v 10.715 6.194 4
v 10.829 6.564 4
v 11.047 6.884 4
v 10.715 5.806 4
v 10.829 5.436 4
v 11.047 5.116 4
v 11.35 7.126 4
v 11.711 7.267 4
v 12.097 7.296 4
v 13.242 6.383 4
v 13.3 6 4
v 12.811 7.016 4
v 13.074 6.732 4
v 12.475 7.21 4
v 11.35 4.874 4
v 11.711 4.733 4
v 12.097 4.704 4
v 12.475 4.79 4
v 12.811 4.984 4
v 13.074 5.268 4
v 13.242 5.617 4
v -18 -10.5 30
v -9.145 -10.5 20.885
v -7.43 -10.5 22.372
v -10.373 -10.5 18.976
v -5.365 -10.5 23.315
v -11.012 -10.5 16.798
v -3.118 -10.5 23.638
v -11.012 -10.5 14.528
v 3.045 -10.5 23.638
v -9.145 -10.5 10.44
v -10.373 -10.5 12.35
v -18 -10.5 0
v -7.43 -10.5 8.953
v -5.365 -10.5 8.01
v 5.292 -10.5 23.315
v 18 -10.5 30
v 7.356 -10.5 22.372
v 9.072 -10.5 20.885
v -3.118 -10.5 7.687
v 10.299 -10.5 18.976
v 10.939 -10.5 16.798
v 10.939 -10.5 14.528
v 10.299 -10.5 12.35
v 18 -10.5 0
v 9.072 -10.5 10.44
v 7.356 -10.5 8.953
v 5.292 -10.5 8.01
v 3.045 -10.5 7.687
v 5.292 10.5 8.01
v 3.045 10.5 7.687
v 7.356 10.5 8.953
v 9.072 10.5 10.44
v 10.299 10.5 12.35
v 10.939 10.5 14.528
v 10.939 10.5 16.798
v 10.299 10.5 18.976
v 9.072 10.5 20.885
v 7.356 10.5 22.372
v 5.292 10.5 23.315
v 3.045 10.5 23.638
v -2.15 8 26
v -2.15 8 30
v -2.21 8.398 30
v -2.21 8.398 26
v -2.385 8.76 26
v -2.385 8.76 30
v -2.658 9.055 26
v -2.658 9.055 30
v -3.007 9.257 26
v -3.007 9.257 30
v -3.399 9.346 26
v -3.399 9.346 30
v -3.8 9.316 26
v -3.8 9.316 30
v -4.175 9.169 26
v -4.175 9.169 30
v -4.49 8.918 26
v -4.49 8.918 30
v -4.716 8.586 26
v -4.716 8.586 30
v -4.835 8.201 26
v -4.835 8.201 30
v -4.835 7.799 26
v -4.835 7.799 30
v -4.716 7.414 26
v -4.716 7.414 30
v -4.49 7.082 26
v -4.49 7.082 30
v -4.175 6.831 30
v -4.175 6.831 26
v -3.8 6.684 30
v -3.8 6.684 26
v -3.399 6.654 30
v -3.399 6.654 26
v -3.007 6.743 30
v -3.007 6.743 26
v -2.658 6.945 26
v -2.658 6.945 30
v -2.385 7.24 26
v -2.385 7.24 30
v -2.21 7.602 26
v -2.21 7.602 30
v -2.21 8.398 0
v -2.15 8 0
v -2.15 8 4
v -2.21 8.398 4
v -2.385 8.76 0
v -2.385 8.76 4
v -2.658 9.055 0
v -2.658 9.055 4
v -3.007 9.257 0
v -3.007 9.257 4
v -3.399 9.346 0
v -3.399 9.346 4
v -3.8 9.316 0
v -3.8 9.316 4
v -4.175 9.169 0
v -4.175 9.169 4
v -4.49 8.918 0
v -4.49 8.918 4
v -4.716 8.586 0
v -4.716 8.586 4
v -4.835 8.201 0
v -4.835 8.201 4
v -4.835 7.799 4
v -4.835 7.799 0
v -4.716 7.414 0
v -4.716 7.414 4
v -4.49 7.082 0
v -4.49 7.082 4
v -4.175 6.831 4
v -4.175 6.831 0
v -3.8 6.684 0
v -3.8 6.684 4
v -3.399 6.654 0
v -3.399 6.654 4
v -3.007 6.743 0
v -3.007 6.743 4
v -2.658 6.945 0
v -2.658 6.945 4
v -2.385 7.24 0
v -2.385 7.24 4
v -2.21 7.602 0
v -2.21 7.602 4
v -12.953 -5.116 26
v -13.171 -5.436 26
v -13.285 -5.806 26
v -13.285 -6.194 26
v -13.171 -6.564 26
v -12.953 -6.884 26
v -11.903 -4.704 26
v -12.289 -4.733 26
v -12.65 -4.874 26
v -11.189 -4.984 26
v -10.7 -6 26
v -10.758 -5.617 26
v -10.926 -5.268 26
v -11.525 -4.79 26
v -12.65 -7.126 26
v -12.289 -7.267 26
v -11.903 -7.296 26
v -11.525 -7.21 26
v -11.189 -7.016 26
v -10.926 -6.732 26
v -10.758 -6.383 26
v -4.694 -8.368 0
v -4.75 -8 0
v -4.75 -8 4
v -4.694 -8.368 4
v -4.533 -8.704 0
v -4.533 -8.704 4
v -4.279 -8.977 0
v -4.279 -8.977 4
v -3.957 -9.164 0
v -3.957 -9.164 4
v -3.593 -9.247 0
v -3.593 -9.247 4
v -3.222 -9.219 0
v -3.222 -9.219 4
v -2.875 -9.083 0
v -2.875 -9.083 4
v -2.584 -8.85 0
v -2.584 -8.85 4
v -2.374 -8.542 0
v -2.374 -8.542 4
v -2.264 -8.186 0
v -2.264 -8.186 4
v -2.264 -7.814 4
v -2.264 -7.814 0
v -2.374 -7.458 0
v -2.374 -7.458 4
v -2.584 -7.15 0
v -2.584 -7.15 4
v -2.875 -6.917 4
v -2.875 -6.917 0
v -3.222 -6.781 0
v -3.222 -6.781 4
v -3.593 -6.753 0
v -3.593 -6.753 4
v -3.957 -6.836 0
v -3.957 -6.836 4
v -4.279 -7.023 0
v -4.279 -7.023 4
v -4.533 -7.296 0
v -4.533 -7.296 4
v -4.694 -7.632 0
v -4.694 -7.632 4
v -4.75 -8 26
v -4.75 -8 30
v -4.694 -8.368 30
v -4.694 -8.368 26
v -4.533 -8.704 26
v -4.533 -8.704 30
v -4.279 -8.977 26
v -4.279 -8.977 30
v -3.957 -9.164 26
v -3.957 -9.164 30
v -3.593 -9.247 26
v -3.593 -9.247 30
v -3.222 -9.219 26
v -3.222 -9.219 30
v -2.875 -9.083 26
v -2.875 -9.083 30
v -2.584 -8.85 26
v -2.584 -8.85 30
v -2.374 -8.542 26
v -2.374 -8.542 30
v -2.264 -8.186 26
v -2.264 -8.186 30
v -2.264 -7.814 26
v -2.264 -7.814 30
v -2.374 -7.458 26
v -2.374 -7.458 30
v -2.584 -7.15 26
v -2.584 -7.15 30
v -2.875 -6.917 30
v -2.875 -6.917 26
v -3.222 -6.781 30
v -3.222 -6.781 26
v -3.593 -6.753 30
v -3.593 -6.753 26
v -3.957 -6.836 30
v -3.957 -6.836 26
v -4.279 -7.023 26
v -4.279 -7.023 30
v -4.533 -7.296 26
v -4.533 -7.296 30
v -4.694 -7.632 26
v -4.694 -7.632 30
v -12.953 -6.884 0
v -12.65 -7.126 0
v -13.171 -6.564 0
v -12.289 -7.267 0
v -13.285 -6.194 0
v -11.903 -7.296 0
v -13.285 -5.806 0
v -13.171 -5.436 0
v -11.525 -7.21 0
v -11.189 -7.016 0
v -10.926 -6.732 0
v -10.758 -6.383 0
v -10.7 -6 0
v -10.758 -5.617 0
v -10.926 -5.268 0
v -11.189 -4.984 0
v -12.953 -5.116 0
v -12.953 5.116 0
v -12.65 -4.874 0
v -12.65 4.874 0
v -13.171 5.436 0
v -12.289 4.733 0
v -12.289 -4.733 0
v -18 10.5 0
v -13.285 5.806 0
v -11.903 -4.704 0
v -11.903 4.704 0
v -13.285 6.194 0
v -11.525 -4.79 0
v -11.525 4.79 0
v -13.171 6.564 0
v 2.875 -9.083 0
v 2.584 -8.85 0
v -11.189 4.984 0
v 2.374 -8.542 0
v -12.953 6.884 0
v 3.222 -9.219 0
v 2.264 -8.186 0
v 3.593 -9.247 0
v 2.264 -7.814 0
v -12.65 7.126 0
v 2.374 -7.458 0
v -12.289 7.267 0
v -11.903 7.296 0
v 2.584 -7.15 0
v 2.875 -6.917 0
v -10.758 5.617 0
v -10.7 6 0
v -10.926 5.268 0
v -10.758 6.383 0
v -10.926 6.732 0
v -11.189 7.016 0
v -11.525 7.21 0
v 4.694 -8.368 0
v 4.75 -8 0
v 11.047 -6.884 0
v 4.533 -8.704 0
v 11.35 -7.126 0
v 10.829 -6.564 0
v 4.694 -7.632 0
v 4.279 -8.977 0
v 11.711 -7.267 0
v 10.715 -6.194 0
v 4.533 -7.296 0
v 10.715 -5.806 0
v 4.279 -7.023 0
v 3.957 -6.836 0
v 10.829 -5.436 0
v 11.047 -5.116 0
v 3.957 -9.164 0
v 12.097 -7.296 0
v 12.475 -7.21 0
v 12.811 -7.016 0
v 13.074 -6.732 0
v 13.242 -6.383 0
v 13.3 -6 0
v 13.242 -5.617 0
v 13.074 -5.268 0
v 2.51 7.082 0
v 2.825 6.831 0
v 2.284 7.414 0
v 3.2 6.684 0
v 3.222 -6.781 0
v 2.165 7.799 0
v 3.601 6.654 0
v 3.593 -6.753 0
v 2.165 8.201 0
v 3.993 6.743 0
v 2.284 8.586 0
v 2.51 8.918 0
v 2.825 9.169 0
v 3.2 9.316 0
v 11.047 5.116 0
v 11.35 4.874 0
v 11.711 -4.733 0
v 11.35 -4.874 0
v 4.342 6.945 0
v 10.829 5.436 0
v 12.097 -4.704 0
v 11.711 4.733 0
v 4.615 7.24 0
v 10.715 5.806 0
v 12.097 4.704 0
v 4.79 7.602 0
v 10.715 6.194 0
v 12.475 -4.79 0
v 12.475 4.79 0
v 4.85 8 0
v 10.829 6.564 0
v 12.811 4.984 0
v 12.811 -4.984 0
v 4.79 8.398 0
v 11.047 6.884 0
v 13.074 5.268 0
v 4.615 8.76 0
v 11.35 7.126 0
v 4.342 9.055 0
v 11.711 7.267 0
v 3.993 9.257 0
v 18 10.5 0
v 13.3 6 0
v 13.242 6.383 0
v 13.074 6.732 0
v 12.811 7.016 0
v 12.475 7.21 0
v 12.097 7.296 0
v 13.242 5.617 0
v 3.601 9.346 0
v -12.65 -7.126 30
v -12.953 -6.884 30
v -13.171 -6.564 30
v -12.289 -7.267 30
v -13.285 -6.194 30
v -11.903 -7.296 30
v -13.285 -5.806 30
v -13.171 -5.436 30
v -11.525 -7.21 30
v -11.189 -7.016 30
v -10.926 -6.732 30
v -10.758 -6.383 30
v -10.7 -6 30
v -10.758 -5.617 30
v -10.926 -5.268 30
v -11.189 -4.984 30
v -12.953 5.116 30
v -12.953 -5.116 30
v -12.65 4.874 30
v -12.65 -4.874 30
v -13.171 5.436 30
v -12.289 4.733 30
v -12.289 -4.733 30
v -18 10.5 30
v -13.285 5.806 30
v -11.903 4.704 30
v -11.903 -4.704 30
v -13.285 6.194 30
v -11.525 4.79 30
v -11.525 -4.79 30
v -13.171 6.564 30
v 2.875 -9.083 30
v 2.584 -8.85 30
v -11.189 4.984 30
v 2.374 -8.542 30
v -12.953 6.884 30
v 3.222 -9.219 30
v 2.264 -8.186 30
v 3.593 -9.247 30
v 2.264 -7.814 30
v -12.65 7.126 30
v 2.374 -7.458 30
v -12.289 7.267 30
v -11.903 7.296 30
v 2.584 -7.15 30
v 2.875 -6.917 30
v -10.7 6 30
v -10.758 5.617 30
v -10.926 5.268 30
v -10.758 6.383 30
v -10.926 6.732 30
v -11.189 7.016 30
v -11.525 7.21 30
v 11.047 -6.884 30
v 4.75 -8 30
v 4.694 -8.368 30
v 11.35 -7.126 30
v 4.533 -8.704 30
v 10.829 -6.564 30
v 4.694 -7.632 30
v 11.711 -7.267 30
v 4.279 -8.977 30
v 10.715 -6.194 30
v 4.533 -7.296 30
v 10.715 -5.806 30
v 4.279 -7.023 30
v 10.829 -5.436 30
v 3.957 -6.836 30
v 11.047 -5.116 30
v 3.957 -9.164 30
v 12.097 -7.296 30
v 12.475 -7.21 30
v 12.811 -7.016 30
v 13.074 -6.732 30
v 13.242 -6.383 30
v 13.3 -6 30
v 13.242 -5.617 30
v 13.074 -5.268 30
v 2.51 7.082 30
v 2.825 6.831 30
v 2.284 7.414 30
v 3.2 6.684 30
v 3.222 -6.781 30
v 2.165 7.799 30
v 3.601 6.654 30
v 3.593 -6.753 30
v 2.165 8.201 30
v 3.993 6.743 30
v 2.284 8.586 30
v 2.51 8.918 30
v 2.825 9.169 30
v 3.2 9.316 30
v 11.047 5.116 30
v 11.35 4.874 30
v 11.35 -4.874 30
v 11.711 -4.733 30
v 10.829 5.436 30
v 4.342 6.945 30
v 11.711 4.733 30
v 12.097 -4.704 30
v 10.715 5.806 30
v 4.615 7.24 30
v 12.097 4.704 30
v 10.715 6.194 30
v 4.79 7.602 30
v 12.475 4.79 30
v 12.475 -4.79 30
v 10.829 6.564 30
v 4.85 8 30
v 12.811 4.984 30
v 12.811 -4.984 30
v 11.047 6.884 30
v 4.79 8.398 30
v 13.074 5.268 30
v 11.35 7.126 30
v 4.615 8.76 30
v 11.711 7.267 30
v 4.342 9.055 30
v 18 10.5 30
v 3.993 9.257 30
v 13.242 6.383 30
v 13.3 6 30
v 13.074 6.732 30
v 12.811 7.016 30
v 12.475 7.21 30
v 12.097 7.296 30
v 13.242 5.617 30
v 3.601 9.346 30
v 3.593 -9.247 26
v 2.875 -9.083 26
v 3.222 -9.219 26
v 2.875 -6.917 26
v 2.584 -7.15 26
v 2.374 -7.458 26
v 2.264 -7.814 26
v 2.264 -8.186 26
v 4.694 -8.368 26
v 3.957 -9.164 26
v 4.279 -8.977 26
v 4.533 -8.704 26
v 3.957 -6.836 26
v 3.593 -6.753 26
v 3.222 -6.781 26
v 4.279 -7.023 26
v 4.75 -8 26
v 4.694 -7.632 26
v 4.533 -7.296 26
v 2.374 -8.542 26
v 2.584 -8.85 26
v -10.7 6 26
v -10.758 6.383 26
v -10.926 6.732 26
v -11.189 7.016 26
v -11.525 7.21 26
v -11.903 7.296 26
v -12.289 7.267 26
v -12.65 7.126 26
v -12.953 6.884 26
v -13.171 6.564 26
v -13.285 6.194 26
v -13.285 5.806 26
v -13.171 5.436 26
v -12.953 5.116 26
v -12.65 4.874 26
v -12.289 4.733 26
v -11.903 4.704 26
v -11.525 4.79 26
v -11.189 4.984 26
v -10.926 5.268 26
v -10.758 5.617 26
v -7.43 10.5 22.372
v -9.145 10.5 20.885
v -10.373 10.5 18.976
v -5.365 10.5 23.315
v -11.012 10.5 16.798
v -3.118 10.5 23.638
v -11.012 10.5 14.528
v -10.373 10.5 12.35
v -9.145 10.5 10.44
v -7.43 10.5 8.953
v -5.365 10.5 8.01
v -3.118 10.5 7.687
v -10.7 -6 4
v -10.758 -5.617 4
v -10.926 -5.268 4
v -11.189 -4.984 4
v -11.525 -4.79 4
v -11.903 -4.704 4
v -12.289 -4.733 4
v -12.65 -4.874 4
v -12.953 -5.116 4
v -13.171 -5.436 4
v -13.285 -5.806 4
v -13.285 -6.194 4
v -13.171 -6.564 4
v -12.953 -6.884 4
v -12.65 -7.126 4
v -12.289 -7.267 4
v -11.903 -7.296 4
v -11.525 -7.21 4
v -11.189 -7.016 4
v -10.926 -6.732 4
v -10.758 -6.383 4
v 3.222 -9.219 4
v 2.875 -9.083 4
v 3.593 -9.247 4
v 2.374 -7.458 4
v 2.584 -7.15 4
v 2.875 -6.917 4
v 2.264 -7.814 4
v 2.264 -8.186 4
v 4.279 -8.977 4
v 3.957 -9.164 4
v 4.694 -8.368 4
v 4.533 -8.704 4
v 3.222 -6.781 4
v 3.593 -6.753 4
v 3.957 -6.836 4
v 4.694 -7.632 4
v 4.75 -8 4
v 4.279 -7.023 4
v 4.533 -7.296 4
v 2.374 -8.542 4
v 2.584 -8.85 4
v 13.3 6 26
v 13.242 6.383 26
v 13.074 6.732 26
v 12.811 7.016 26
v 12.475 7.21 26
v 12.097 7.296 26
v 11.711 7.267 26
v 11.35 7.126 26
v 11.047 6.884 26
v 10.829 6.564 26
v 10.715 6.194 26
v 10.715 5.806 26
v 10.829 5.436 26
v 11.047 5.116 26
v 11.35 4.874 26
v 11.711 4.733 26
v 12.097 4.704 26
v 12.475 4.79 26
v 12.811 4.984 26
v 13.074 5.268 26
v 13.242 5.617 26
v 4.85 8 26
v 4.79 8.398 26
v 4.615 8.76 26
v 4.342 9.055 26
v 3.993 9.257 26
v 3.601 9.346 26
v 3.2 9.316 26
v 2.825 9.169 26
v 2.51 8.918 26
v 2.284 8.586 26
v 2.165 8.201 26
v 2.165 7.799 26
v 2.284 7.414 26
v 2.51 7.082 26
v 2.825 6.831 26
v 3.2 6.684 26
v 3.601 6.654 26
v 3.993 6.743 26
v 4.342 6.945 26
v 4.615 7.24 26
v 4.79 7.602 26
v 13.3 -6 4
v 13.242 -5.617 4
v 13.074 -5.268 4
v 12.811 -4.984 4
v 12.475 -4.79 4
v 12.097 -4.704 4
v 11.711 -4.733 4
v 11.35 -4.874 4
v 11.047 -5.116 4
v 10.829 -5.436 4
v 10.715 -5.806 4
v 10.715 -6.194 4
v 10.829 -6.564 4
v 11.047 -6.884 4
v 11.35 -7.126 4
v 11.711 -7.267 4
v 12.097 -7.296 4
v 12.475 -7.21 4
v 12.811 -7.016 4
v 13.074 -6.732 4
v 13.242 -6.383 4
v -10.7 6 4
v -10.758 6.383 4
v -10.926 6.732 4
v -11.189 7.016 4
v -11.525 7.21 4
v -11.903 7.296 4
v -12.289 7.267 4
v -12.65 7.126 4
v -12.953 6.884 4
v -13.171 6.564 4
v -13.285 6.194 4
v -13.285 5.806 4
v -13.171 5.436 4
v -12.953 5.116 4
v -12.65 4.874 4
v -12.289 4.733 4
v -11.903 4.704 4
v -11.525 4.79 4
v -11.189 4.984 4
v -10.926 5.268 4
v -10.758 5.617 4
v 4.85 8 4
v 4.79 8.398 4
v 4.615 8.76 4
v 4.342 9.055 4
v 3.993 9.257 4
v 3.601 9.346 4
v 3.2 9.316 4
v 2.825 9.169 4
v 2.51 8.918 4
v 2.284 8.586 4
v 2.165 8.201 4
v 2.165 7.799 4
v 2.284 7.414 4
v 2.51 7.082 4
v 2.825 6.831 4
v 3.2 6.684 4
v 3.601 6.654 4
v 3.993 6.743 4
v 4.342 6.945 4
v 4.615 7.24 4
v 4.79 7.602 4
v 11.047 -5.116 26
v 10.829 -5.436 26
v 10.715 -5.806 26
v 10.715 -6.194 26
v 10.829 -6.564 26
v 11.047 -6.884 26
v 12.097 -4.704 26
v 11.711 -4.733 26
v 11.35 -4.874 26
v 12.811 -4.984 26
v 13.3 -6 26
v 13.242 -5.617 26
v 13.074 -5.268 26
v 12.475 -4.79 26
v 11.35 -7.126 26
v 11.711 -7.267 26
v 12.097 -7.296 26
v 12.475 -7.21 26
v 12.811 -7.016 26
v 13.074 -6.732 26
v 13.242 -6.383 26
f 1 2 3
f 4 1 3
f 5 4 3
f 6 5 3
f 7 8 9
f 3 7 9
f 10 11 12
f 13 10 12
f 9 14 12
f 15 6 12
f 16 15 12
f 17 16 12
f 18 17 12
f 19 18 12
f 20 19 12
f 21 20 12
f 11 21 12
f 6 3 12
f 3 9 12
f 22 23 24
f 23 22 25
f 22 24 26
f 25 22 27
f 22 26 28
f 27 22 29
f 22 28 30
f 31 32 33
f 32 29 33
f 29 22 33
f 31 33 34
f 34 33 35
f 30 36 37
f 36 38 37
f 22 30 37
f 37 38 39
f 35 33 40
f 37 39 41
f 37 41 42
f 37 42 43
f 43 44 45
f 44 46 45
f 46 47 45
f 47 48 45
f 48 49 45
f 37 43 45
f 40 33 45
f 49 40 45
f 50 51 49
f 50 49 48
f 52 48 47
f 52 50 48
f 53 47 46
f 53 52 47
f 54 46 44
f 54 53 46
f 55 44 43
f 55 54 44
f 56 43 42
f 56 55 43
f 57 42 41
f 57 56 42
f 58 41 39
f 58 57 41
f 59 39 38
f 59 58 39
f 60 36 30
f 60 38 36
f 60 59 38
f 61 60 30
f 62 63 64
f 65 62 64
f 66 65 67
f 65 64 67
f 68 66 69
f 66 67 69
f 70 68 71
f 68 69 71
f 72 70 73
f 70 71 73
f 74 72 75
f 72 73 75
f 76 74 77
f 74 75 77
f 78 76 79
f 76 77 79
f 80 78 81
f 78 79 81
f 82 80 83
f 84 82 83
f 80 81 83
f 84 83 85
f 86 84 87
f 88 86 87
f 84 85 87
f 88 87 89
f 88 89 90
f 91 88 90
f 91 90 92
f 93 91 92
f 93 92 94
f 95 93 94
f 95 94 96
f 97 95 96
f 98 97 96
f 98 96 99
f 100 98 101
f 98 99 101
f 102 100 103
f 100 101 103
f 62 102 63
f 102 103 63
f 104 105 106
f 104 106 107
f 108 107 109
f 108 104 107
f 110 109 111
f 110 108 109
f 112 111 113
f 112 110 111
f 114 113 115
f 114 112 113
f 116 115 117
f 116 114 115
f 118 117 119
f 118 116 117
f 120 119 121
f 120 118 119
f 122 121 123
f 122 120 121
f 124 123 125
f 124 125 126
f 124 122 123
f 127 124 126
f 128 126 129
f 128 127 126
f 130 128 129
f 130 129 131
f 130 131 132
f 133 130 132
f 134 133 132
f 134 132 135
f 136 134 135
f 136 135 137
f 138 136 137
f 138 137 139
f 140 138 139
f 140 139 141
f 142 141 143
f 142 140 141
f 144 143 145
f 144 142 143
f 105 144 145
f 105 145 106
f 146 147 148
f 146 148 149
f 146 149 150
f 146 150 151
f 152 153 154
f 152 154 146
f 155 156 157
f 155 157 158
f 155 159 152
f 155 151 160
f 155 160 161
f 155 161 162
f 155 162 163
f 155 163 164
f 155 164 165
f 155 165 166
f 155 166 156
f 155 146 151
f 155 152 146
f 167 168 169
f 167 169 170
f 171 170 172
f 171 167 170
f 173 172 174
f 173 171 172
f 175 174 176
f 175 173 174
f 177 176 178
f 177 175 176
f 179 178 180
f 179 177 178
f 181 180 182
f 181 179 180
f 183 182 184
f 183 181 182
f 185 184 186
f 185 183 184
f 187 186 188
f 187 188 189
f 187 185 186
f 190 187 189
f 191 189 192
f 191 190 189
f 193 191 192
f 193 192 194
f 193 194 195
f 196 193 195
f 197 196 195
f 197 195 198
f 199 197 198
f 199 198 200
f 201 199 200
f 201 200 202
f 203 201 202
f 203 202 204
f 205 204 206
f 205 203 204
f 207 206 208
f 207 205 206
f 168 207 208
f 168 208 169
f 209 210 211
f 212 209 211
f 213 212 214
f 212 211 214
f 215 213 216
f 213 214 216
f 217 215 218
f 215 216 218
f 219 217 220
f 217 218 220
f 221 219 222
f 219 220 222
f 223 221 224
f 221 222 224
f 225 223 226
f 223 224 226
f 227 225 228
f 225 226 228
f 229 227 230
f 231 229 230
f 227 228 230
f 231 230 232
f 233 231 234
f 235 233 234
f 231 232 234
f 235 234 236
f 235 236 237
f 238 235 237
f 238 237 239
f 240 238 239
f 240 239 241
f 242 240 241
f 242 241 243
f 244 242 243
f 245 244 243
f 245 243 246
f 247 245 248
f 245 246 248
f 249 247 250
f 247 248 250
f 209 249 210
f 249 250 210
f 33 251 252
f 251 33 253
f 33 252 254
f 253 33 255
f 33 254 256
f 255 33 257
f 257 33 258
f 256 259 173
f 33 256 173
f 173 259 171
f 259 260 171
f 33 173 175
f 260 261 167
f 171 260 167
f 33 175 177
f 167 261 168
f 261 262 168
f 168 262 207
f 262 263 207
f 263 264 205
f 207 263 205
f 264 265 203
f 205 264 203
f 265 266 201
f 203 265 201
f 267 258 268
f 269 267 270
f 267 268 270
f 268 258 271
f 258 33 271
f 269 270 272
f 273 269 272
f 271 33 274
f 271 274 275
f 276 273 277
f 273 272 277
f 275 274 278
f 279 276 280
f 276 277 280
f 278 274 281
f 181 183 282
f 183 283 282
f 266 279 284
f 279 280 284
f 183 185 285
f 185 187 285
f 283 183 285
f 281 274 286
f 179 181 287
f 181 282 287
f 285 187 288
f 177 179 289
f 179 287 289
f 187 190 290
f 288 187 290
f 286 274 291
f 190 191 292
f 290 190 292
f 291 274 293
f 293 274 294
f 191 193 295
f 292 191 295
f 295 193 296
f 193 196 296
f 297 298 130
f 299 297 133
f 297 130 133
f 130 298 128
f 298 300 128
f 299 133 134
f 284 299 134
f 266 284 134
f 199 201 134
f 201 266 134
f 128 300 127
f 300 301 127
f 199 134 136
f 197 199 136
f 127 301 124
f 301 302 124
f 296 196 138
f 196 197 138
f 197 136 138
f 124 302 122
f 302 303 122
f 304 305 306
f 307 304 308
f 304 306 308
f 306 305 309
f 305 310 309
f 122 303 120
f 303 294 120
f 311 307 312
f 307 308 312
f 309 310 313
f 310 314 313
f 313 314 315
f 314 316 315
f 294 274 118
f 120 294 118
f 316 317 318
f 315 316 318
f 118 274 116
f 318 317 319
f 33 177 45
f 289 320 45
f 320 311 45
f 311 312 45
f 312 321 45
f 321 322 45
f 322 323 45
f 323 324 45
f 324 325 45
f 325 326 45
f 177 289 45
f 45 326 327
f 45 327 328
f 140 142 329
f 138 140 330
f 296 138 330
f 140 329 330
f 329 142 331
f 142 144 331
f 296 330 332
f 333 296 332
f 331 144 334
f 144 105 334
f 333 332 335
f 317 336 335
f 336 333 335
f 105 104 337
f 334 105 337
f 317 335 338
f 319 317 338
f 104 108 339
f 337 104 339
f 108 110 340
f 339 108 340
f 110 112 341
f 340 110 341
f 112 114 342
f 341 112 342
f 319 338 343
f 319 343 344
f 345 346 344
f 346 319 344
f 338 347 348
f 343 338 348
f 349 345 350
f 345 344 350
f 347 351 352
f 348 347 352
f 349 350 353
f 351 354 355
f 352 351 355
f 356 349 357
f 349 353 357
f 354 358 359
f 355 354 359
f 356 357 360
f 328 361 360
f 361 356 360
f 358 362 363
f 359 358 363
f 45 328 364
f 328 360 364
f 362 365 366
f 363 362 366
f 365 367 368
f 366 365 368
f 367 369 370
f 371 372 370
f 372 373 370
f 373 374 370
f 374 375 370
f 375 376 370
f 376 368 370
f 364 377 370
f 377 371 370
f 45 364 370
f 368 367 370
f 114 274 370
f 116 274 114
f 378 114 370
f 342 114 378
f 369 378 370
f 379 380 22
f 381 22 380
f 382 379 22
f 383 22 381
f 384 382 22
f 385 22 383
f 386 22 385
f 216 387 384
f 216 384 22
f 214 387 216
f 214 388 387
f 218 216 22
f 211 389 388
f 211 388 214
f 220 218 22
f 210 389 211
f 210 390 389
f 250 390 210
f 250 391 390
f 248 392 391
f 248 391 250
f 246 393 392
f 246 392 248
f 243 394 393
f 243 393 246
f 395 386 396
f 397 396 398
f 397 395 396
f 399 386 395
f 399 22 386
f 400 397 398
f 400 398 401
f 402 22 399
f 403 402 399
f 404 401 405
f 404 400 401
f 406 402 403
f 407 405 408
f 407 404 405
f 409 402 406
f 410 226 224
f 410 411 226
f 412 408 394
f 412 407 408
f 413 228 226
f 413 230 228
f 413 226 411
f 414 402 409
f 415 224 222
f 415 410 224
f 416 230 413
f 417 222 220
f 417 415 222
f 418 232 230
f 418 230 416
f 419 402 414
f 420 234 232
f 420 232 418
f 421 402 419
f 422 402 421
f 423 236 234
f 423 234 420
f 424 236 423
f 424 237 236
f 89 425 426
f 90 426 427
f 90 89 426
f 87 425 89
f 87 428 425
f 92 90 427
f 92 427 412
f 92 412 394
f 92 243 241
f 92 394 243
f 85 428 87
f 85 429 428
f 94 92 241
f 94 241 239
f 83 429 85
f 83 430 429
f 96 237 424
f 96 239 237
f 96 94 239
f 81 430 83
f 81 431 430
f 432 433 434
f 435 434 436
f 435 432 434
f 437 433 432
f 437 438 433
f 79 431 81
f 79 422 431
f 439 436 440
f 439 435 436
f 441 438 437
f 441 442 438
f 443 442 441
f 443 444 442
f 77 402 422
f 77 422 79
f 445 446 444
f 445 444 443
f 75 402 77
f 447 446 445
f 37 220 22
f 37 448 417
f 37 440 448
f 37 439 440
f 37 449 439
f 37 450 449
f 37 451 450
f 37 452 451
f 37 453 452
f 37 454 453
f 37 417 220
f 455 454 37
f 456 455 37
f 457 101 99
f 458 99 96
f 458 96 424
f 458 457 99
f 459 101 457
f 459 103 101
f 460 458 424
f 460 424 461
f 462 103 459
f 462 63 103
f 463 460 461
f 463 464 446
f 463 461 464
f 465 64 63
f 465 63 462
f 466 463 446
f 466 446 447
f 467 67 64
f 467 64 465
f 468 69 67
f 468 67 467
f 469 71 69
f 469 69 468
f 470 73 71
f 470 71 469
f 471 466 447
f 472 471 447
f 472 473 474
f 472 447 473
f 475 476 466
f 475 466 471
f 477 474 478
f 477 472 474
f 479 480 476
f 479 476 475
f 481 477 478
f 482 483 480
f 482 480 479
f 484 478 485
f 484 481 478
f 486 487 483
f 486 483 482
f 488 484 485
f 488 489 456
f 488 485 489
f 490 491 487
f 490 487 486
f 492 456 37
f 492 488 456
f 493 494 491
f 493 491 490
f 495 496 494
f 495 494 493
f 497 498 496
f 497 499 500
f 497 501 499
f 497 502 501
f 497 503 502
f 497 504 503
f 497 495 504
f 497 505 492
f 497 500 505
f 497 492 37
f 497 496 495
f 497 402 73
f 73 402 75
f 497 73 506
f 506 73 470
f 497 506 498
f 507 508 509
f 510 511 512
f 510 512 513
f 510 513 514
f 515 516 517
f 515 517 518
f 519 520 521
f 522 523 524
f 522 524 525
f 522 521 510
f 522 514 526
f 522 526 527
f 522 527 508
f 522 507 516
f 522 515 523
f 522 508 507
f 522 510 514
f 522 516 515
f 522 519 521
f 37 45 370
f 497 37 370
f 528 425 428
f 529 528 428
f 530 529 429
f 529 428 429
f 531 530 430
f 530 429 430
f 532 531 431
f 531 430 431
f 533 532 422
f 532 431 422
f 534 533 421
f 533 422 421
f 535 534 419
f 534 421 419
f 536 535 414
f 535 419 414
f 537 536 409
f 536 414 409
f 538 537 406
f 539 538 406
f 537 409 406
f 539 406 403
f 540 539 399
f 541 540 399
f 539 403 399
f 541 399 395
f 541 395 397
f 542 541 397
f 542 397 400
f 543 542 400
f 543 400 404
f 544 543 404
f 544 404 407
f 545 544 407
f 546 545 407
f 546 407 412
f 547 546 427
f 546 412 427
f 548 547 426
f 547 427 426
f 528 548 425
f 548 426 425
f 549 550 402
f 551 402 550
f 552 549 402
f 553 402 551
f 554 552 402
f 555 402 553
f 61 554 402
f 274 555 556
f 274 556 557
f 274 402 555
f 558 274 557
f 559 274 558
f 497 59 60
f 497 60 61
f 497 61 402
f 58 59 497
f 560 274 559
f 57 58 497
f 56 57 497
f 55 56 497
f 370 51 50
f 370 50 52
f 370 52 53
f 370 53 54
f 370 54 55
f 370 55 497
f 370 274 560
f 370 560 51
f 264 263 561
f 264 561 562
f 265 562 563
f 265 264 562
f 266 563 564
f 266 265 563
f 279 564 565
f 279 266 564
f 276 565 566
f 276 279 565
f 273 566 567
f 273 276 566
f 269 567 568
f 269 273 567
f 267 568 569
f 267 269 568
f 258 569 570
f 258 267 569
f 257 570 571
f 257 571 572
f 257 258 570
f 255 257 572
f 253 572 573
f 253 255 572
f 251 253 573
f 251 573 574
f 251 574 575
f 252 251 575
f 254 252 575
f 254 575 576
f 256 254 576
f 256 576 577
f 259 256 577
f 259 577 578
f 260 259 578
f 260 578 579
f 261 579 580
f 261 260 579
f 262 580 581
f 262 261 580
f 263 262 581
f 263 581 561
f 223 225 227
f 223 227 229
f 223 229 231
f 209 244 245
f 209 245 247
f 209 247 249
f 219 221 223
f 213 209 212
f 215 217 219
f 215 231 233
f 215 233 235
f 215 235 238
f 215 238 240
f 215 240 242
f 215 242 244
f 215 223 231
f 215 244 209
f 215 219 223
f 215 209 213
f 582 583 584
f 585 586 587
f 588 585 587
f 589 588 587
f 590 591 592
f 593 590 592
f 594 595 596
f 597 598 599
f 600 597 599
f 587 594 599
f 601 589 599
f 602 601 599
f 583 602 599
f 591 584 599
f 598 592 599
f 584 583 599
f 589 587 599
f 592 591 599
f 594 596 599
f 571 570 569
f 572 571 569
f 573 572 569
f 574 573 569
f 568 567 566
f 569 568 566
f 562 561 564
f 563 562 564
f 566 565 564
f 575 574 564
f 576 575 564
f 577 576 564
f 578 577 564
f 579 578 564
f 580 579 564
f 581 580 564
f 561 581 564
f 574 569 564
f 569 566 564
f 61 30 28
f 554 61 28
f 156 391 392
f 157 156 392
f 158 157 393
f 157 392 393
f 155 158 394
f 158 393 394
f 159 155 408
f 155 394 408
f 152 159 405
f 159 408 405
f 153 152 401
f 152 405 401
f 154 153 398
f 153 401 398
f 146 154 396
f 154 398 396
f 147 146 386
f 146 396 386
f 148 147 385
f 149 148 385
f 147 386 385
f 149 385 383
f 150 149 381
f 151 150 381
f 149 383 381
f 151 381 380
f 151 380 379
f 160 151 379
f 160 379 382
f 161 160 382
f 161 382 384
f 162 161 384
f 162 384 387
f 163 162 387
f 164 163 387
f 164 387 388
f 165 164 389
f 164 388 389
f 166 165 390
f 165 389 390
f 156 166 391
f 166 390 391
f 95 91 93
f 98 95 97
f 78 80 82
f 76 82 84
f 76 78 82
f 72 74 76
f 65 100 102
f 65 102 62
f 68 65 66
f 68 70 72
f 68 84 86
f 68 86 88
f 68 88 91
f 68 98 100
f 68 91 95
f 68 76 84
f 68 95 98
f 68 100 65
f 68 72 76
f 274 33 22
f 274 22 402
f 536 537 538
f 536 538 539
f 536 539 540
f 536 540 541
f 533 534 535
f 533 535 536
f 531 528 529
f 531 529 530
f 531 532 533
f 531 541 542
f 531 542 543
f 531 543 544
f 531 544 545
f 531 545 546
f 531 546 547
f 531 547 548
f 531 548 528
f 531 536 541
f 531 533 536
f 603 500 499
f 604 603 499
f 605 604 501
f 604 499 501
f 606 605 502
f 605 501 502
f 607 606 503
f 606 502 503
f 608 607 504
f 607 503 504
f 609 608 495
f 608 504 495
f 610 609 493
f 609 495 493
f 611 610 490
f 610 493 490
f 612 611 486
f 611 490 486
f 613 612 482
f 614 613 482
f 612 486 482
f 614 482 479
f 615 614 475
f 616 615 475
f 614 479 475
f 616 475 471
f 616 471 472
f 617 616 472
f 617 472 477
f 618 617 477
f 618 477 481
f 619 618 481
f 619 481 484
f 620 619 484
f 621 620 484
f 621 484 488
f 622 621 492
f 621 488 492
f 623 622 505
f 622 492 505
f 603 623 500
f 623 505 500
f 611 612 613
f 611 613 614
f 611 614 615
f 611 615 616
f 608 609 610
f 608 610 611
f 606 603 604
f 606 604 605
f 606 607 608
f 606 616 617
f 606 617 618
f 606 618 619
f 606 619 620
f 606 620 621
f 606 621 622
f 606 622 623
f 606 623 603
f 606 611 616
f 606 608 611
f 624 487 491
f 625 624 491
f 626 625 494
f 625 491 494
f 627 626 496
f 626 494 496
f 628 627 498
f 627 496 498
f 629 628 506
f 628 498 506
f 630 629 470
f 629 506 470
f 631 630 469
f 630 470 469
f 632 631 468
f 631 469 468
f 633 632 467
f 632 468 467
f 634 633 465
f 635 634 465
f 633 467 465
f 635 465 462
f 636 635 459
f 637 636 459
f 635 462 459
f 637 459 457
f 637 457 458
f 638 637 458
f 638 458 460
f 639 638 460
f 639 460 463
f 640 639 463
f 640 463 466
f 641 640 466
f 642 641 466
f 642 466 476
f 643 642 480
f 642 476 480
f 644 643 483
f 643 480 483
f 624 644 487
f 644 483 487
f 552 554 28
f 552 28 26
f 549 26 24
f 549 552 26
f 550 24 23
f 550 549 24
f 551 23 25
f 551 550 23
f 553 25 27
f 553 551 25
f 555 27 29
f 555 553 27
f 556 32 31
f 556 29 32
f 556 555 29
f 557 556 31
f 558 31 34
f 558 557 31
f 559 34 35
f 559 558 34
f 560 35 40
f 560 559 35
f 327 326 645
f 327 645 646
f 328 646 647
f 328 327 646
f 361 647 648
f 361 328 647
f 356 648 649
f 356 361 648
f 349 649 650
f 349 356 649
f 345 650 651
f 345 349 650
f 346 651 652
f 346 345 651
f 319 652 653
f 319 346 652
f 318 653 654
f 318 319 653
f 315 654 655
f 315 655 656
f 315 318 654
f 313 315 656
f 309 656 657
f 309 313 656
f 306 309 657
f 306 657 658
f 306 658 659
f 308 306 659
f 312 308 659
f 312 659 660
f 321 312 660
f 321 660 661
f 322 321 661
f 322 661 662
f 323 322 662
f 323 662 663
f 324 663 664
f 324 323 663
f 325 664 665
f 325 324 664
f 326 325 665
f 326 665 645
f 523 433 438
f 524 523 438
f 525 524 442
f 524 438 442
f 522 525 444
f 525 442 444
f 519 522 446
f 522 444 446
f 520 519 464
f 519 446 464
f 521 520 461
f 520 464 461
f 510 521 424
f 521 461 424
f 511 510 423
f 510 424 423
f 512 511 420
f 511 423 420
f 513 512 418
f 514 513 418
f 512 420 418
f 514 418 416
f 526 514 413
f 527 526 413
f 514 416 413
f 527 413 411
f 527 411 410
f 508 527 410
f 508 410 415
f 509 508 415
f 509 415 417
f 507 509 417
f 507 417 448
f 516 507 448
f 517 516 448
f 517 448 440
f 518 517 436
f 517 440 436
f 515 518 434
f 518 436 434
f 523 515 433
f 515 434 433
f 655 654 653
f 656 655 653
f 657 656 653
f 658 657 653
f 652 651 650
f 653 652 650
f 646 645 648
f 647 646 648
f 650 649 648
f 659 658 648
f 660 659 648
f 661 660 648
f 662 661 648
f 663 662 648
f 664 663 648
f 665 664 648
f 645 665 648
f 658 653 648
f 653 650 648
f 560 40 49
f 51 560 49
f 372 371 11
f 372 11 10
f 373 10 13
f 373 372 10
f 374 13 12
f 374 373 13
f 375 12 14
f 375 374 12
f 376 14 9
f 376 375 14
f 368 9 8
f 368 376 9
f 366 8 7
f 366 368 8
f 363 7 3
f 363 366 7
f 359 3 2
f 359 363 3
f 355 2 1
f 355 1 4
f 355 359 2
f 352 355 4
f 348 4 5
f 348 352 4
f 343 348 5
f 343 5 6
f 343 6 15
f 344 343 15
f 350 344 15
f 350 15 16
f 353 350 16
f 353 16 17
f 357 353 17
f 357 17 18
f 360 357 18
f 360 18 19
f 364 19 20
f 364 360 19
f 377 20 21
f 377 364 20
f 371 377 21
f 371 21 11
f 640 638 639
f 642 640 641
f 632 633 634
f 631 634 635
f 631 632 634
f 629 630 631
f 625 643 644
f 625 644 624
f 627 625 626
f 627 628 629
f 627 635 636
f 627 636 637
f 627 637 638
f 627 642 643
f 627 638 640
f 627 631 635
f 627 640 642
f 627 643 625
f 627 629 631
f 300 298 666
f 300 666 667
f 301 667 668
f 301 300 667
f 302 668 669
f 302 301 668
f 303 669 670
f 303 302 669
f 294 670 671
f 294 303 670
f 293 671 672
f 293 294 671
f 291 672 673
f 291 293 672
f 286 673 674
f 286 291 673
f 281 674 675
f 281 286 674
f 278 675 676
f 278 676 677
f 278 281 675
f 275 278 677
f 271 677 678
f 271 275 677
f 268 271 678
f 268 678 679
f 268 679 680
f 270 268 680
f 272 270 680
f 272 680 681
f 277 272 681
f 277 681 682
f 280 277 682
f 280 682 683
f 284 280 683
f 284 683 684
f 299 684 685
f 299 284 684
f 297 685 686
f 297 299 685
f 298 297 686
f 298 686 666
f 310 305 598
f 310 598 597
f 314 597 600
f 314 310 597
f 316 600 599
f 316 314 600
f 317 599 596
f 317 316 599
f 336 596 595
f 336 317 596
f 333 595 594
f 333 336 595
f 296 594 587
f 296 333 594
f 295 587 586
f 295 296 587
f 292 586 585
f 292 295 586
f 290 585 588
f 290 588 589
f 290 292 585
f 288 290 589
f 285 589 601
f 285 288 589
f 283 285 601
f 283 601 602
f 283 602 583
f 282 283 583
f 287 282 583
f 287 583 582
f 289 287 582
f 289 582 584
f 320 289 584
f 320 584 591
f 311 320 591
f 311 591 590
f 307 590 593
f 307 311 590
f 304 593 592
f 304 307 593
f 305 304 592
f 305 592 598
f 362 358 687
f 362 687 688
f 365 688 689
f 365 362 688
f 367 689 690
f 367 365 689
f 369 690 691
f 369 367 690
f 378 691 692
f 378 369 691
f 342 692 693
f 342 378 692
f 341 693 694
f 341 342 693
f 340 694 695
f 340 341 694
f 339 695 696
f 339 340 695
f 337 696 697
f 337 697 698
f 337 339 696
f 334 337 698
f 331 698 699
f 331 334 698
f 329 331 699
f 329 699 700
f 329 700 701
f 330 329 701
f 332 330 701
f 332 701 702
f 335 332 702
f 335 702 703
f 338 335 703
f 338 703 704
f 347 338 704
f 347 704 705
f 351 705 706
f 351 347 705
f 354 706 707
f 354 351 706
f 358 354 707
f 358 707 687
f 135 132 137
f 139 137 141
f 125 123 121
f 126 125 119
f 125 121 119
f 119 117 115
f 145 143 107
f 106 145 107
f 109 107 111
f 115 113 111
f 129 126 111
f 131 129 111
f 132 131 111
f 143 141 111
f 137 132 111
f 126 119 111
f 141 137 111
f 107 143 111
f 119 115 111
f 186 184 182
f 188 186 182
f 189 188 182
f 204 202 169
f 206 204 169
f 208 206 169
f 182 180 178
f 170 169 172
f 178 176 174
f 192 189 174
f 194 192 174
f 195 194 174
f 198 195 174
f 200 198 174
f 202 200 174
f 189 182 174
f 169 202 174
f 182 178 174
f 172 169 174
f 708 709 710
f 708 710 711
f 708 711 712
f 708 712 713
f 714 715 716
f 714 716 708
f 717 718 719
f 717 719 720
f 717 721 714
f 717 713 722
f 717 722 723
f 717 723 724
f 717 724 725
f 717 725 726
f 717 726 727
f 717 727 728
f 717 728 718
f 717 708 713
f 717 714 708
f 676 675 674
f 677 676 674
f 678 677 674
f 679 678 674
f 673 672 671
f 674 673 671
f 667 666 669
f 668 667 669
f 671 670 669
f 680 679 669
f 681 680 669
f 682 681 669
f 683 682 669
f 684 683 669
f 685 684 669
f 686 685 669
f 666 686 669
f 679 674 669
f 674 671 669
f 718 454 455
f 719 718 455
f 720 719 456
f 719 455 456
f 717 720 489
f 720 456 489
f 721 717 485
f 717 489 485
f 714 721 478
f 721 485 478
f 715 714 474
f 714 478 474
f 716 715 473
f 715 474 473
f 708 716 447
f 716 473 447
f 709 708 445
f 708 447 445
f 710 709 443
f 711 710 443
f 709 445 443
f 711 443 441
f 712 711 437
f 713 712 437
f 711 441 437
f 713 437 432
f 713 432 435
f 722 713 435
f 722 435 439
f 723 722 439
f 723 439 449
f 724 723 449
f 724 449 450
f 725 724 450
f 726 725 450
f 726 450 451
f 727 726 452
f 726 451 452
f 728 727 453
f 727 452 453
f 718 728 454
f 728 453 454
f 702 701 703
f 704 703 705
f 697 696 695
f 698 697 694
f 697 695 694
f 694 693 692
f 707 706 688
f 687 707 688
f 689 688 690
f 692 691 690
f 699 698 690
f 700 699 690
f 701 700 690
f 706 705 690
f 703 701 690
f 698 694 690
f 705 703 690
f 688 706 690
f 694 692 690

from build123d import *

# Parameters (mm, degrees)
SKETCH_1_W          = 36
SKETCH_1_H          = 21
SKETCH_1_R          = 1.25
SKETCH_1_R_2        = 1.3
SKETCH_1_R_3        = 1.35
EXTRUDE_1_DEPTH     = 30
SKETCH_1_5_R        = 1.3
SKETCH_1_5_R_2      = 1.35
SKETCH_1_5_R_3      = 1.25
CUT_EXTRUDE_1_DEPTH = 4
CUT_EXTRUDE_START   = 30
SKETCH_1_6_R        = 1.35
SKETCH_1_6_R_2      = 1.3
SKETCH_1_6_R_3      = 1.25
CUT_EXTRUDE_2_DEPTH = 4
CUT_EXTRUDE1_DEPTH  = 30


with BuildPart() as part:
    # 스케치1 → 보스-돌출1 (new body)
    with BuildSketch(Plane.XY):
        Rectangle(SKETCH_1_W, SKETCH_1_H)
        with Locations((-3.5, -8)):
            Circle(SKETCH_1_R, mode=Mode.SUBTRACT)
        with Locations((3.5, -8)):
            Circle(SKETCH_1_R, mode=Mode.SUBTRACT)
        with Locations((-12, 6)):
            Circle(SKETCH_1_R_2, mode=Mode.SUBTRACT)
        with Locations((12, 6)):
            Circle(SKETCH_1_R_2, mode=Mode.SUBTRACT)
        with Locations((12, -6)):
            Circle(SKETCH_1_R_2, mode=Mode.SUBTRACT)
        with Locations((-12, -6)):
            Circle(SKETCH_1_R_2, mode=Mode.SUBTRACT)
        with Locations((3.5, 8)):
            Circle(SKETCH_1_R_3, mode=Mode.SUBTRACT)
        with Locations((-3.5, 8)):
            Circle(SKETCH_1_R_3, mode=Mode.SUBTRACT)
        with Locations((12, -6)):
            Circle(SKETCH_1_R_2)
        with Locations((3.5, -8)):
            Circle(SKETCH_1_R)
        with Locations((-3.5, -8)):
            Circle(SKETCH_1_R)
        with Locations((-12, -6)):
            Circle(SKETCH_1_R_2)
        with Locations((-12, 6)):
            Circle(SKETCH_1_R_2)
        with Locations((-3.5, 8)):
            Circle(SKETCH_1_R_3)
        with Locations((3.5, 8)):
            Circle(SKETCH_1_R_3)
        with Locations((12, 6)):
            Circle(SKETCH_1_R_2)
    extrude(amount=EXTRUDE_1_DEPTH)

    # 스케치1<5> → 컷-돌출1 (cut)
    with BuildSketch(Plane.XY):
        with Locations((12, 6)):
            Circle(SKETCH_1_5_R)
        with Locations((3.5, 8)):
            Circle(SKETCH_1_5_R_2)
        with Locations((-3.5, 8)):
            Circle(SKETCH_1_5_R_2)
        with Locations((-12, 6)):
            Circle(SKETCH_1_5_R)
        with Locations((-12, -6)):
            Circle(SKETCH_1_5_R)
        with Locations(Location((-3.5, -8, 0), (0, 0, 180))):
            Circle(SKETCH_1_5_R_3)
        with Locations((3.5, -8)):
            Circle(SKETCH_1_5_R_3)
        with Locations((12, -6)):
            Circle(SKETCH_1_5_R)
    extrude(amount=CUT_EXTRUDE_1_DEPTH, mode=Mode.SUBTRACT)

    # 스케치1<6> → 컷-돌출2 (cut)
    with BuildSketch(Plane.XY.offset(CUT_EXTRUDE_START)):
        with Locations((3.5, 8)):
            Circle(SKETCH_1_6_R)
        with Locations((12, 6)):
            Circle(SKETCH_1_6_R_2)
        with Locations((-3.5, 8)):
            Circle(SKETCH_1_6_R)
        with Locations((-12, 6)):
            Circle(SKETCH_1_6_R_2)
        with Locations((-12, -6)):
            Circle(SKETCH_1_6_R_2)
        with Locations(Location((-3.5, -8, 0), (0, 0, 180))):
            Circle(SKETCH_1_6_R_3)
        with Locations((3.5, -8)):
            Circle(SKETCH_1_6_R_3)
        with Locations((12, -6)):
            Circle(SKETCH_1_6_R_2)
    extrude(amount=-CUT_EXTRUDE_2_DEPTH, mode=Mode.SUBTRACT)

    # Sketch1 → Cut-Extrude1 (cut)
    with BuildSketch(Plane(origin=(0, 10.5, 0), x_dir=(1, 0, 0), z_dir=(0, 1, 0))):
        with BuildLine():
            Line((-3.118018925, -7.687381661), (3.044704105, -7.687381661))
            ThreePointArc((3.044704105, -7.687381661), (11.019992732, -15.662670288), (3.044704105, -23.637958915))
            Line((3.044704105, -23.637958915), (-3.118018925, -23.637958915))
            ThreePointArc((-3.118018925, -23.637958915), (-11.093307551, -15.662670288), (-3.118018925, -7.687381661))
        make_face()
    extrude(amount=-CUT_EXTRUDE1_DEPTH, mode=Mode.SUBTRACT)


solid = part.part
